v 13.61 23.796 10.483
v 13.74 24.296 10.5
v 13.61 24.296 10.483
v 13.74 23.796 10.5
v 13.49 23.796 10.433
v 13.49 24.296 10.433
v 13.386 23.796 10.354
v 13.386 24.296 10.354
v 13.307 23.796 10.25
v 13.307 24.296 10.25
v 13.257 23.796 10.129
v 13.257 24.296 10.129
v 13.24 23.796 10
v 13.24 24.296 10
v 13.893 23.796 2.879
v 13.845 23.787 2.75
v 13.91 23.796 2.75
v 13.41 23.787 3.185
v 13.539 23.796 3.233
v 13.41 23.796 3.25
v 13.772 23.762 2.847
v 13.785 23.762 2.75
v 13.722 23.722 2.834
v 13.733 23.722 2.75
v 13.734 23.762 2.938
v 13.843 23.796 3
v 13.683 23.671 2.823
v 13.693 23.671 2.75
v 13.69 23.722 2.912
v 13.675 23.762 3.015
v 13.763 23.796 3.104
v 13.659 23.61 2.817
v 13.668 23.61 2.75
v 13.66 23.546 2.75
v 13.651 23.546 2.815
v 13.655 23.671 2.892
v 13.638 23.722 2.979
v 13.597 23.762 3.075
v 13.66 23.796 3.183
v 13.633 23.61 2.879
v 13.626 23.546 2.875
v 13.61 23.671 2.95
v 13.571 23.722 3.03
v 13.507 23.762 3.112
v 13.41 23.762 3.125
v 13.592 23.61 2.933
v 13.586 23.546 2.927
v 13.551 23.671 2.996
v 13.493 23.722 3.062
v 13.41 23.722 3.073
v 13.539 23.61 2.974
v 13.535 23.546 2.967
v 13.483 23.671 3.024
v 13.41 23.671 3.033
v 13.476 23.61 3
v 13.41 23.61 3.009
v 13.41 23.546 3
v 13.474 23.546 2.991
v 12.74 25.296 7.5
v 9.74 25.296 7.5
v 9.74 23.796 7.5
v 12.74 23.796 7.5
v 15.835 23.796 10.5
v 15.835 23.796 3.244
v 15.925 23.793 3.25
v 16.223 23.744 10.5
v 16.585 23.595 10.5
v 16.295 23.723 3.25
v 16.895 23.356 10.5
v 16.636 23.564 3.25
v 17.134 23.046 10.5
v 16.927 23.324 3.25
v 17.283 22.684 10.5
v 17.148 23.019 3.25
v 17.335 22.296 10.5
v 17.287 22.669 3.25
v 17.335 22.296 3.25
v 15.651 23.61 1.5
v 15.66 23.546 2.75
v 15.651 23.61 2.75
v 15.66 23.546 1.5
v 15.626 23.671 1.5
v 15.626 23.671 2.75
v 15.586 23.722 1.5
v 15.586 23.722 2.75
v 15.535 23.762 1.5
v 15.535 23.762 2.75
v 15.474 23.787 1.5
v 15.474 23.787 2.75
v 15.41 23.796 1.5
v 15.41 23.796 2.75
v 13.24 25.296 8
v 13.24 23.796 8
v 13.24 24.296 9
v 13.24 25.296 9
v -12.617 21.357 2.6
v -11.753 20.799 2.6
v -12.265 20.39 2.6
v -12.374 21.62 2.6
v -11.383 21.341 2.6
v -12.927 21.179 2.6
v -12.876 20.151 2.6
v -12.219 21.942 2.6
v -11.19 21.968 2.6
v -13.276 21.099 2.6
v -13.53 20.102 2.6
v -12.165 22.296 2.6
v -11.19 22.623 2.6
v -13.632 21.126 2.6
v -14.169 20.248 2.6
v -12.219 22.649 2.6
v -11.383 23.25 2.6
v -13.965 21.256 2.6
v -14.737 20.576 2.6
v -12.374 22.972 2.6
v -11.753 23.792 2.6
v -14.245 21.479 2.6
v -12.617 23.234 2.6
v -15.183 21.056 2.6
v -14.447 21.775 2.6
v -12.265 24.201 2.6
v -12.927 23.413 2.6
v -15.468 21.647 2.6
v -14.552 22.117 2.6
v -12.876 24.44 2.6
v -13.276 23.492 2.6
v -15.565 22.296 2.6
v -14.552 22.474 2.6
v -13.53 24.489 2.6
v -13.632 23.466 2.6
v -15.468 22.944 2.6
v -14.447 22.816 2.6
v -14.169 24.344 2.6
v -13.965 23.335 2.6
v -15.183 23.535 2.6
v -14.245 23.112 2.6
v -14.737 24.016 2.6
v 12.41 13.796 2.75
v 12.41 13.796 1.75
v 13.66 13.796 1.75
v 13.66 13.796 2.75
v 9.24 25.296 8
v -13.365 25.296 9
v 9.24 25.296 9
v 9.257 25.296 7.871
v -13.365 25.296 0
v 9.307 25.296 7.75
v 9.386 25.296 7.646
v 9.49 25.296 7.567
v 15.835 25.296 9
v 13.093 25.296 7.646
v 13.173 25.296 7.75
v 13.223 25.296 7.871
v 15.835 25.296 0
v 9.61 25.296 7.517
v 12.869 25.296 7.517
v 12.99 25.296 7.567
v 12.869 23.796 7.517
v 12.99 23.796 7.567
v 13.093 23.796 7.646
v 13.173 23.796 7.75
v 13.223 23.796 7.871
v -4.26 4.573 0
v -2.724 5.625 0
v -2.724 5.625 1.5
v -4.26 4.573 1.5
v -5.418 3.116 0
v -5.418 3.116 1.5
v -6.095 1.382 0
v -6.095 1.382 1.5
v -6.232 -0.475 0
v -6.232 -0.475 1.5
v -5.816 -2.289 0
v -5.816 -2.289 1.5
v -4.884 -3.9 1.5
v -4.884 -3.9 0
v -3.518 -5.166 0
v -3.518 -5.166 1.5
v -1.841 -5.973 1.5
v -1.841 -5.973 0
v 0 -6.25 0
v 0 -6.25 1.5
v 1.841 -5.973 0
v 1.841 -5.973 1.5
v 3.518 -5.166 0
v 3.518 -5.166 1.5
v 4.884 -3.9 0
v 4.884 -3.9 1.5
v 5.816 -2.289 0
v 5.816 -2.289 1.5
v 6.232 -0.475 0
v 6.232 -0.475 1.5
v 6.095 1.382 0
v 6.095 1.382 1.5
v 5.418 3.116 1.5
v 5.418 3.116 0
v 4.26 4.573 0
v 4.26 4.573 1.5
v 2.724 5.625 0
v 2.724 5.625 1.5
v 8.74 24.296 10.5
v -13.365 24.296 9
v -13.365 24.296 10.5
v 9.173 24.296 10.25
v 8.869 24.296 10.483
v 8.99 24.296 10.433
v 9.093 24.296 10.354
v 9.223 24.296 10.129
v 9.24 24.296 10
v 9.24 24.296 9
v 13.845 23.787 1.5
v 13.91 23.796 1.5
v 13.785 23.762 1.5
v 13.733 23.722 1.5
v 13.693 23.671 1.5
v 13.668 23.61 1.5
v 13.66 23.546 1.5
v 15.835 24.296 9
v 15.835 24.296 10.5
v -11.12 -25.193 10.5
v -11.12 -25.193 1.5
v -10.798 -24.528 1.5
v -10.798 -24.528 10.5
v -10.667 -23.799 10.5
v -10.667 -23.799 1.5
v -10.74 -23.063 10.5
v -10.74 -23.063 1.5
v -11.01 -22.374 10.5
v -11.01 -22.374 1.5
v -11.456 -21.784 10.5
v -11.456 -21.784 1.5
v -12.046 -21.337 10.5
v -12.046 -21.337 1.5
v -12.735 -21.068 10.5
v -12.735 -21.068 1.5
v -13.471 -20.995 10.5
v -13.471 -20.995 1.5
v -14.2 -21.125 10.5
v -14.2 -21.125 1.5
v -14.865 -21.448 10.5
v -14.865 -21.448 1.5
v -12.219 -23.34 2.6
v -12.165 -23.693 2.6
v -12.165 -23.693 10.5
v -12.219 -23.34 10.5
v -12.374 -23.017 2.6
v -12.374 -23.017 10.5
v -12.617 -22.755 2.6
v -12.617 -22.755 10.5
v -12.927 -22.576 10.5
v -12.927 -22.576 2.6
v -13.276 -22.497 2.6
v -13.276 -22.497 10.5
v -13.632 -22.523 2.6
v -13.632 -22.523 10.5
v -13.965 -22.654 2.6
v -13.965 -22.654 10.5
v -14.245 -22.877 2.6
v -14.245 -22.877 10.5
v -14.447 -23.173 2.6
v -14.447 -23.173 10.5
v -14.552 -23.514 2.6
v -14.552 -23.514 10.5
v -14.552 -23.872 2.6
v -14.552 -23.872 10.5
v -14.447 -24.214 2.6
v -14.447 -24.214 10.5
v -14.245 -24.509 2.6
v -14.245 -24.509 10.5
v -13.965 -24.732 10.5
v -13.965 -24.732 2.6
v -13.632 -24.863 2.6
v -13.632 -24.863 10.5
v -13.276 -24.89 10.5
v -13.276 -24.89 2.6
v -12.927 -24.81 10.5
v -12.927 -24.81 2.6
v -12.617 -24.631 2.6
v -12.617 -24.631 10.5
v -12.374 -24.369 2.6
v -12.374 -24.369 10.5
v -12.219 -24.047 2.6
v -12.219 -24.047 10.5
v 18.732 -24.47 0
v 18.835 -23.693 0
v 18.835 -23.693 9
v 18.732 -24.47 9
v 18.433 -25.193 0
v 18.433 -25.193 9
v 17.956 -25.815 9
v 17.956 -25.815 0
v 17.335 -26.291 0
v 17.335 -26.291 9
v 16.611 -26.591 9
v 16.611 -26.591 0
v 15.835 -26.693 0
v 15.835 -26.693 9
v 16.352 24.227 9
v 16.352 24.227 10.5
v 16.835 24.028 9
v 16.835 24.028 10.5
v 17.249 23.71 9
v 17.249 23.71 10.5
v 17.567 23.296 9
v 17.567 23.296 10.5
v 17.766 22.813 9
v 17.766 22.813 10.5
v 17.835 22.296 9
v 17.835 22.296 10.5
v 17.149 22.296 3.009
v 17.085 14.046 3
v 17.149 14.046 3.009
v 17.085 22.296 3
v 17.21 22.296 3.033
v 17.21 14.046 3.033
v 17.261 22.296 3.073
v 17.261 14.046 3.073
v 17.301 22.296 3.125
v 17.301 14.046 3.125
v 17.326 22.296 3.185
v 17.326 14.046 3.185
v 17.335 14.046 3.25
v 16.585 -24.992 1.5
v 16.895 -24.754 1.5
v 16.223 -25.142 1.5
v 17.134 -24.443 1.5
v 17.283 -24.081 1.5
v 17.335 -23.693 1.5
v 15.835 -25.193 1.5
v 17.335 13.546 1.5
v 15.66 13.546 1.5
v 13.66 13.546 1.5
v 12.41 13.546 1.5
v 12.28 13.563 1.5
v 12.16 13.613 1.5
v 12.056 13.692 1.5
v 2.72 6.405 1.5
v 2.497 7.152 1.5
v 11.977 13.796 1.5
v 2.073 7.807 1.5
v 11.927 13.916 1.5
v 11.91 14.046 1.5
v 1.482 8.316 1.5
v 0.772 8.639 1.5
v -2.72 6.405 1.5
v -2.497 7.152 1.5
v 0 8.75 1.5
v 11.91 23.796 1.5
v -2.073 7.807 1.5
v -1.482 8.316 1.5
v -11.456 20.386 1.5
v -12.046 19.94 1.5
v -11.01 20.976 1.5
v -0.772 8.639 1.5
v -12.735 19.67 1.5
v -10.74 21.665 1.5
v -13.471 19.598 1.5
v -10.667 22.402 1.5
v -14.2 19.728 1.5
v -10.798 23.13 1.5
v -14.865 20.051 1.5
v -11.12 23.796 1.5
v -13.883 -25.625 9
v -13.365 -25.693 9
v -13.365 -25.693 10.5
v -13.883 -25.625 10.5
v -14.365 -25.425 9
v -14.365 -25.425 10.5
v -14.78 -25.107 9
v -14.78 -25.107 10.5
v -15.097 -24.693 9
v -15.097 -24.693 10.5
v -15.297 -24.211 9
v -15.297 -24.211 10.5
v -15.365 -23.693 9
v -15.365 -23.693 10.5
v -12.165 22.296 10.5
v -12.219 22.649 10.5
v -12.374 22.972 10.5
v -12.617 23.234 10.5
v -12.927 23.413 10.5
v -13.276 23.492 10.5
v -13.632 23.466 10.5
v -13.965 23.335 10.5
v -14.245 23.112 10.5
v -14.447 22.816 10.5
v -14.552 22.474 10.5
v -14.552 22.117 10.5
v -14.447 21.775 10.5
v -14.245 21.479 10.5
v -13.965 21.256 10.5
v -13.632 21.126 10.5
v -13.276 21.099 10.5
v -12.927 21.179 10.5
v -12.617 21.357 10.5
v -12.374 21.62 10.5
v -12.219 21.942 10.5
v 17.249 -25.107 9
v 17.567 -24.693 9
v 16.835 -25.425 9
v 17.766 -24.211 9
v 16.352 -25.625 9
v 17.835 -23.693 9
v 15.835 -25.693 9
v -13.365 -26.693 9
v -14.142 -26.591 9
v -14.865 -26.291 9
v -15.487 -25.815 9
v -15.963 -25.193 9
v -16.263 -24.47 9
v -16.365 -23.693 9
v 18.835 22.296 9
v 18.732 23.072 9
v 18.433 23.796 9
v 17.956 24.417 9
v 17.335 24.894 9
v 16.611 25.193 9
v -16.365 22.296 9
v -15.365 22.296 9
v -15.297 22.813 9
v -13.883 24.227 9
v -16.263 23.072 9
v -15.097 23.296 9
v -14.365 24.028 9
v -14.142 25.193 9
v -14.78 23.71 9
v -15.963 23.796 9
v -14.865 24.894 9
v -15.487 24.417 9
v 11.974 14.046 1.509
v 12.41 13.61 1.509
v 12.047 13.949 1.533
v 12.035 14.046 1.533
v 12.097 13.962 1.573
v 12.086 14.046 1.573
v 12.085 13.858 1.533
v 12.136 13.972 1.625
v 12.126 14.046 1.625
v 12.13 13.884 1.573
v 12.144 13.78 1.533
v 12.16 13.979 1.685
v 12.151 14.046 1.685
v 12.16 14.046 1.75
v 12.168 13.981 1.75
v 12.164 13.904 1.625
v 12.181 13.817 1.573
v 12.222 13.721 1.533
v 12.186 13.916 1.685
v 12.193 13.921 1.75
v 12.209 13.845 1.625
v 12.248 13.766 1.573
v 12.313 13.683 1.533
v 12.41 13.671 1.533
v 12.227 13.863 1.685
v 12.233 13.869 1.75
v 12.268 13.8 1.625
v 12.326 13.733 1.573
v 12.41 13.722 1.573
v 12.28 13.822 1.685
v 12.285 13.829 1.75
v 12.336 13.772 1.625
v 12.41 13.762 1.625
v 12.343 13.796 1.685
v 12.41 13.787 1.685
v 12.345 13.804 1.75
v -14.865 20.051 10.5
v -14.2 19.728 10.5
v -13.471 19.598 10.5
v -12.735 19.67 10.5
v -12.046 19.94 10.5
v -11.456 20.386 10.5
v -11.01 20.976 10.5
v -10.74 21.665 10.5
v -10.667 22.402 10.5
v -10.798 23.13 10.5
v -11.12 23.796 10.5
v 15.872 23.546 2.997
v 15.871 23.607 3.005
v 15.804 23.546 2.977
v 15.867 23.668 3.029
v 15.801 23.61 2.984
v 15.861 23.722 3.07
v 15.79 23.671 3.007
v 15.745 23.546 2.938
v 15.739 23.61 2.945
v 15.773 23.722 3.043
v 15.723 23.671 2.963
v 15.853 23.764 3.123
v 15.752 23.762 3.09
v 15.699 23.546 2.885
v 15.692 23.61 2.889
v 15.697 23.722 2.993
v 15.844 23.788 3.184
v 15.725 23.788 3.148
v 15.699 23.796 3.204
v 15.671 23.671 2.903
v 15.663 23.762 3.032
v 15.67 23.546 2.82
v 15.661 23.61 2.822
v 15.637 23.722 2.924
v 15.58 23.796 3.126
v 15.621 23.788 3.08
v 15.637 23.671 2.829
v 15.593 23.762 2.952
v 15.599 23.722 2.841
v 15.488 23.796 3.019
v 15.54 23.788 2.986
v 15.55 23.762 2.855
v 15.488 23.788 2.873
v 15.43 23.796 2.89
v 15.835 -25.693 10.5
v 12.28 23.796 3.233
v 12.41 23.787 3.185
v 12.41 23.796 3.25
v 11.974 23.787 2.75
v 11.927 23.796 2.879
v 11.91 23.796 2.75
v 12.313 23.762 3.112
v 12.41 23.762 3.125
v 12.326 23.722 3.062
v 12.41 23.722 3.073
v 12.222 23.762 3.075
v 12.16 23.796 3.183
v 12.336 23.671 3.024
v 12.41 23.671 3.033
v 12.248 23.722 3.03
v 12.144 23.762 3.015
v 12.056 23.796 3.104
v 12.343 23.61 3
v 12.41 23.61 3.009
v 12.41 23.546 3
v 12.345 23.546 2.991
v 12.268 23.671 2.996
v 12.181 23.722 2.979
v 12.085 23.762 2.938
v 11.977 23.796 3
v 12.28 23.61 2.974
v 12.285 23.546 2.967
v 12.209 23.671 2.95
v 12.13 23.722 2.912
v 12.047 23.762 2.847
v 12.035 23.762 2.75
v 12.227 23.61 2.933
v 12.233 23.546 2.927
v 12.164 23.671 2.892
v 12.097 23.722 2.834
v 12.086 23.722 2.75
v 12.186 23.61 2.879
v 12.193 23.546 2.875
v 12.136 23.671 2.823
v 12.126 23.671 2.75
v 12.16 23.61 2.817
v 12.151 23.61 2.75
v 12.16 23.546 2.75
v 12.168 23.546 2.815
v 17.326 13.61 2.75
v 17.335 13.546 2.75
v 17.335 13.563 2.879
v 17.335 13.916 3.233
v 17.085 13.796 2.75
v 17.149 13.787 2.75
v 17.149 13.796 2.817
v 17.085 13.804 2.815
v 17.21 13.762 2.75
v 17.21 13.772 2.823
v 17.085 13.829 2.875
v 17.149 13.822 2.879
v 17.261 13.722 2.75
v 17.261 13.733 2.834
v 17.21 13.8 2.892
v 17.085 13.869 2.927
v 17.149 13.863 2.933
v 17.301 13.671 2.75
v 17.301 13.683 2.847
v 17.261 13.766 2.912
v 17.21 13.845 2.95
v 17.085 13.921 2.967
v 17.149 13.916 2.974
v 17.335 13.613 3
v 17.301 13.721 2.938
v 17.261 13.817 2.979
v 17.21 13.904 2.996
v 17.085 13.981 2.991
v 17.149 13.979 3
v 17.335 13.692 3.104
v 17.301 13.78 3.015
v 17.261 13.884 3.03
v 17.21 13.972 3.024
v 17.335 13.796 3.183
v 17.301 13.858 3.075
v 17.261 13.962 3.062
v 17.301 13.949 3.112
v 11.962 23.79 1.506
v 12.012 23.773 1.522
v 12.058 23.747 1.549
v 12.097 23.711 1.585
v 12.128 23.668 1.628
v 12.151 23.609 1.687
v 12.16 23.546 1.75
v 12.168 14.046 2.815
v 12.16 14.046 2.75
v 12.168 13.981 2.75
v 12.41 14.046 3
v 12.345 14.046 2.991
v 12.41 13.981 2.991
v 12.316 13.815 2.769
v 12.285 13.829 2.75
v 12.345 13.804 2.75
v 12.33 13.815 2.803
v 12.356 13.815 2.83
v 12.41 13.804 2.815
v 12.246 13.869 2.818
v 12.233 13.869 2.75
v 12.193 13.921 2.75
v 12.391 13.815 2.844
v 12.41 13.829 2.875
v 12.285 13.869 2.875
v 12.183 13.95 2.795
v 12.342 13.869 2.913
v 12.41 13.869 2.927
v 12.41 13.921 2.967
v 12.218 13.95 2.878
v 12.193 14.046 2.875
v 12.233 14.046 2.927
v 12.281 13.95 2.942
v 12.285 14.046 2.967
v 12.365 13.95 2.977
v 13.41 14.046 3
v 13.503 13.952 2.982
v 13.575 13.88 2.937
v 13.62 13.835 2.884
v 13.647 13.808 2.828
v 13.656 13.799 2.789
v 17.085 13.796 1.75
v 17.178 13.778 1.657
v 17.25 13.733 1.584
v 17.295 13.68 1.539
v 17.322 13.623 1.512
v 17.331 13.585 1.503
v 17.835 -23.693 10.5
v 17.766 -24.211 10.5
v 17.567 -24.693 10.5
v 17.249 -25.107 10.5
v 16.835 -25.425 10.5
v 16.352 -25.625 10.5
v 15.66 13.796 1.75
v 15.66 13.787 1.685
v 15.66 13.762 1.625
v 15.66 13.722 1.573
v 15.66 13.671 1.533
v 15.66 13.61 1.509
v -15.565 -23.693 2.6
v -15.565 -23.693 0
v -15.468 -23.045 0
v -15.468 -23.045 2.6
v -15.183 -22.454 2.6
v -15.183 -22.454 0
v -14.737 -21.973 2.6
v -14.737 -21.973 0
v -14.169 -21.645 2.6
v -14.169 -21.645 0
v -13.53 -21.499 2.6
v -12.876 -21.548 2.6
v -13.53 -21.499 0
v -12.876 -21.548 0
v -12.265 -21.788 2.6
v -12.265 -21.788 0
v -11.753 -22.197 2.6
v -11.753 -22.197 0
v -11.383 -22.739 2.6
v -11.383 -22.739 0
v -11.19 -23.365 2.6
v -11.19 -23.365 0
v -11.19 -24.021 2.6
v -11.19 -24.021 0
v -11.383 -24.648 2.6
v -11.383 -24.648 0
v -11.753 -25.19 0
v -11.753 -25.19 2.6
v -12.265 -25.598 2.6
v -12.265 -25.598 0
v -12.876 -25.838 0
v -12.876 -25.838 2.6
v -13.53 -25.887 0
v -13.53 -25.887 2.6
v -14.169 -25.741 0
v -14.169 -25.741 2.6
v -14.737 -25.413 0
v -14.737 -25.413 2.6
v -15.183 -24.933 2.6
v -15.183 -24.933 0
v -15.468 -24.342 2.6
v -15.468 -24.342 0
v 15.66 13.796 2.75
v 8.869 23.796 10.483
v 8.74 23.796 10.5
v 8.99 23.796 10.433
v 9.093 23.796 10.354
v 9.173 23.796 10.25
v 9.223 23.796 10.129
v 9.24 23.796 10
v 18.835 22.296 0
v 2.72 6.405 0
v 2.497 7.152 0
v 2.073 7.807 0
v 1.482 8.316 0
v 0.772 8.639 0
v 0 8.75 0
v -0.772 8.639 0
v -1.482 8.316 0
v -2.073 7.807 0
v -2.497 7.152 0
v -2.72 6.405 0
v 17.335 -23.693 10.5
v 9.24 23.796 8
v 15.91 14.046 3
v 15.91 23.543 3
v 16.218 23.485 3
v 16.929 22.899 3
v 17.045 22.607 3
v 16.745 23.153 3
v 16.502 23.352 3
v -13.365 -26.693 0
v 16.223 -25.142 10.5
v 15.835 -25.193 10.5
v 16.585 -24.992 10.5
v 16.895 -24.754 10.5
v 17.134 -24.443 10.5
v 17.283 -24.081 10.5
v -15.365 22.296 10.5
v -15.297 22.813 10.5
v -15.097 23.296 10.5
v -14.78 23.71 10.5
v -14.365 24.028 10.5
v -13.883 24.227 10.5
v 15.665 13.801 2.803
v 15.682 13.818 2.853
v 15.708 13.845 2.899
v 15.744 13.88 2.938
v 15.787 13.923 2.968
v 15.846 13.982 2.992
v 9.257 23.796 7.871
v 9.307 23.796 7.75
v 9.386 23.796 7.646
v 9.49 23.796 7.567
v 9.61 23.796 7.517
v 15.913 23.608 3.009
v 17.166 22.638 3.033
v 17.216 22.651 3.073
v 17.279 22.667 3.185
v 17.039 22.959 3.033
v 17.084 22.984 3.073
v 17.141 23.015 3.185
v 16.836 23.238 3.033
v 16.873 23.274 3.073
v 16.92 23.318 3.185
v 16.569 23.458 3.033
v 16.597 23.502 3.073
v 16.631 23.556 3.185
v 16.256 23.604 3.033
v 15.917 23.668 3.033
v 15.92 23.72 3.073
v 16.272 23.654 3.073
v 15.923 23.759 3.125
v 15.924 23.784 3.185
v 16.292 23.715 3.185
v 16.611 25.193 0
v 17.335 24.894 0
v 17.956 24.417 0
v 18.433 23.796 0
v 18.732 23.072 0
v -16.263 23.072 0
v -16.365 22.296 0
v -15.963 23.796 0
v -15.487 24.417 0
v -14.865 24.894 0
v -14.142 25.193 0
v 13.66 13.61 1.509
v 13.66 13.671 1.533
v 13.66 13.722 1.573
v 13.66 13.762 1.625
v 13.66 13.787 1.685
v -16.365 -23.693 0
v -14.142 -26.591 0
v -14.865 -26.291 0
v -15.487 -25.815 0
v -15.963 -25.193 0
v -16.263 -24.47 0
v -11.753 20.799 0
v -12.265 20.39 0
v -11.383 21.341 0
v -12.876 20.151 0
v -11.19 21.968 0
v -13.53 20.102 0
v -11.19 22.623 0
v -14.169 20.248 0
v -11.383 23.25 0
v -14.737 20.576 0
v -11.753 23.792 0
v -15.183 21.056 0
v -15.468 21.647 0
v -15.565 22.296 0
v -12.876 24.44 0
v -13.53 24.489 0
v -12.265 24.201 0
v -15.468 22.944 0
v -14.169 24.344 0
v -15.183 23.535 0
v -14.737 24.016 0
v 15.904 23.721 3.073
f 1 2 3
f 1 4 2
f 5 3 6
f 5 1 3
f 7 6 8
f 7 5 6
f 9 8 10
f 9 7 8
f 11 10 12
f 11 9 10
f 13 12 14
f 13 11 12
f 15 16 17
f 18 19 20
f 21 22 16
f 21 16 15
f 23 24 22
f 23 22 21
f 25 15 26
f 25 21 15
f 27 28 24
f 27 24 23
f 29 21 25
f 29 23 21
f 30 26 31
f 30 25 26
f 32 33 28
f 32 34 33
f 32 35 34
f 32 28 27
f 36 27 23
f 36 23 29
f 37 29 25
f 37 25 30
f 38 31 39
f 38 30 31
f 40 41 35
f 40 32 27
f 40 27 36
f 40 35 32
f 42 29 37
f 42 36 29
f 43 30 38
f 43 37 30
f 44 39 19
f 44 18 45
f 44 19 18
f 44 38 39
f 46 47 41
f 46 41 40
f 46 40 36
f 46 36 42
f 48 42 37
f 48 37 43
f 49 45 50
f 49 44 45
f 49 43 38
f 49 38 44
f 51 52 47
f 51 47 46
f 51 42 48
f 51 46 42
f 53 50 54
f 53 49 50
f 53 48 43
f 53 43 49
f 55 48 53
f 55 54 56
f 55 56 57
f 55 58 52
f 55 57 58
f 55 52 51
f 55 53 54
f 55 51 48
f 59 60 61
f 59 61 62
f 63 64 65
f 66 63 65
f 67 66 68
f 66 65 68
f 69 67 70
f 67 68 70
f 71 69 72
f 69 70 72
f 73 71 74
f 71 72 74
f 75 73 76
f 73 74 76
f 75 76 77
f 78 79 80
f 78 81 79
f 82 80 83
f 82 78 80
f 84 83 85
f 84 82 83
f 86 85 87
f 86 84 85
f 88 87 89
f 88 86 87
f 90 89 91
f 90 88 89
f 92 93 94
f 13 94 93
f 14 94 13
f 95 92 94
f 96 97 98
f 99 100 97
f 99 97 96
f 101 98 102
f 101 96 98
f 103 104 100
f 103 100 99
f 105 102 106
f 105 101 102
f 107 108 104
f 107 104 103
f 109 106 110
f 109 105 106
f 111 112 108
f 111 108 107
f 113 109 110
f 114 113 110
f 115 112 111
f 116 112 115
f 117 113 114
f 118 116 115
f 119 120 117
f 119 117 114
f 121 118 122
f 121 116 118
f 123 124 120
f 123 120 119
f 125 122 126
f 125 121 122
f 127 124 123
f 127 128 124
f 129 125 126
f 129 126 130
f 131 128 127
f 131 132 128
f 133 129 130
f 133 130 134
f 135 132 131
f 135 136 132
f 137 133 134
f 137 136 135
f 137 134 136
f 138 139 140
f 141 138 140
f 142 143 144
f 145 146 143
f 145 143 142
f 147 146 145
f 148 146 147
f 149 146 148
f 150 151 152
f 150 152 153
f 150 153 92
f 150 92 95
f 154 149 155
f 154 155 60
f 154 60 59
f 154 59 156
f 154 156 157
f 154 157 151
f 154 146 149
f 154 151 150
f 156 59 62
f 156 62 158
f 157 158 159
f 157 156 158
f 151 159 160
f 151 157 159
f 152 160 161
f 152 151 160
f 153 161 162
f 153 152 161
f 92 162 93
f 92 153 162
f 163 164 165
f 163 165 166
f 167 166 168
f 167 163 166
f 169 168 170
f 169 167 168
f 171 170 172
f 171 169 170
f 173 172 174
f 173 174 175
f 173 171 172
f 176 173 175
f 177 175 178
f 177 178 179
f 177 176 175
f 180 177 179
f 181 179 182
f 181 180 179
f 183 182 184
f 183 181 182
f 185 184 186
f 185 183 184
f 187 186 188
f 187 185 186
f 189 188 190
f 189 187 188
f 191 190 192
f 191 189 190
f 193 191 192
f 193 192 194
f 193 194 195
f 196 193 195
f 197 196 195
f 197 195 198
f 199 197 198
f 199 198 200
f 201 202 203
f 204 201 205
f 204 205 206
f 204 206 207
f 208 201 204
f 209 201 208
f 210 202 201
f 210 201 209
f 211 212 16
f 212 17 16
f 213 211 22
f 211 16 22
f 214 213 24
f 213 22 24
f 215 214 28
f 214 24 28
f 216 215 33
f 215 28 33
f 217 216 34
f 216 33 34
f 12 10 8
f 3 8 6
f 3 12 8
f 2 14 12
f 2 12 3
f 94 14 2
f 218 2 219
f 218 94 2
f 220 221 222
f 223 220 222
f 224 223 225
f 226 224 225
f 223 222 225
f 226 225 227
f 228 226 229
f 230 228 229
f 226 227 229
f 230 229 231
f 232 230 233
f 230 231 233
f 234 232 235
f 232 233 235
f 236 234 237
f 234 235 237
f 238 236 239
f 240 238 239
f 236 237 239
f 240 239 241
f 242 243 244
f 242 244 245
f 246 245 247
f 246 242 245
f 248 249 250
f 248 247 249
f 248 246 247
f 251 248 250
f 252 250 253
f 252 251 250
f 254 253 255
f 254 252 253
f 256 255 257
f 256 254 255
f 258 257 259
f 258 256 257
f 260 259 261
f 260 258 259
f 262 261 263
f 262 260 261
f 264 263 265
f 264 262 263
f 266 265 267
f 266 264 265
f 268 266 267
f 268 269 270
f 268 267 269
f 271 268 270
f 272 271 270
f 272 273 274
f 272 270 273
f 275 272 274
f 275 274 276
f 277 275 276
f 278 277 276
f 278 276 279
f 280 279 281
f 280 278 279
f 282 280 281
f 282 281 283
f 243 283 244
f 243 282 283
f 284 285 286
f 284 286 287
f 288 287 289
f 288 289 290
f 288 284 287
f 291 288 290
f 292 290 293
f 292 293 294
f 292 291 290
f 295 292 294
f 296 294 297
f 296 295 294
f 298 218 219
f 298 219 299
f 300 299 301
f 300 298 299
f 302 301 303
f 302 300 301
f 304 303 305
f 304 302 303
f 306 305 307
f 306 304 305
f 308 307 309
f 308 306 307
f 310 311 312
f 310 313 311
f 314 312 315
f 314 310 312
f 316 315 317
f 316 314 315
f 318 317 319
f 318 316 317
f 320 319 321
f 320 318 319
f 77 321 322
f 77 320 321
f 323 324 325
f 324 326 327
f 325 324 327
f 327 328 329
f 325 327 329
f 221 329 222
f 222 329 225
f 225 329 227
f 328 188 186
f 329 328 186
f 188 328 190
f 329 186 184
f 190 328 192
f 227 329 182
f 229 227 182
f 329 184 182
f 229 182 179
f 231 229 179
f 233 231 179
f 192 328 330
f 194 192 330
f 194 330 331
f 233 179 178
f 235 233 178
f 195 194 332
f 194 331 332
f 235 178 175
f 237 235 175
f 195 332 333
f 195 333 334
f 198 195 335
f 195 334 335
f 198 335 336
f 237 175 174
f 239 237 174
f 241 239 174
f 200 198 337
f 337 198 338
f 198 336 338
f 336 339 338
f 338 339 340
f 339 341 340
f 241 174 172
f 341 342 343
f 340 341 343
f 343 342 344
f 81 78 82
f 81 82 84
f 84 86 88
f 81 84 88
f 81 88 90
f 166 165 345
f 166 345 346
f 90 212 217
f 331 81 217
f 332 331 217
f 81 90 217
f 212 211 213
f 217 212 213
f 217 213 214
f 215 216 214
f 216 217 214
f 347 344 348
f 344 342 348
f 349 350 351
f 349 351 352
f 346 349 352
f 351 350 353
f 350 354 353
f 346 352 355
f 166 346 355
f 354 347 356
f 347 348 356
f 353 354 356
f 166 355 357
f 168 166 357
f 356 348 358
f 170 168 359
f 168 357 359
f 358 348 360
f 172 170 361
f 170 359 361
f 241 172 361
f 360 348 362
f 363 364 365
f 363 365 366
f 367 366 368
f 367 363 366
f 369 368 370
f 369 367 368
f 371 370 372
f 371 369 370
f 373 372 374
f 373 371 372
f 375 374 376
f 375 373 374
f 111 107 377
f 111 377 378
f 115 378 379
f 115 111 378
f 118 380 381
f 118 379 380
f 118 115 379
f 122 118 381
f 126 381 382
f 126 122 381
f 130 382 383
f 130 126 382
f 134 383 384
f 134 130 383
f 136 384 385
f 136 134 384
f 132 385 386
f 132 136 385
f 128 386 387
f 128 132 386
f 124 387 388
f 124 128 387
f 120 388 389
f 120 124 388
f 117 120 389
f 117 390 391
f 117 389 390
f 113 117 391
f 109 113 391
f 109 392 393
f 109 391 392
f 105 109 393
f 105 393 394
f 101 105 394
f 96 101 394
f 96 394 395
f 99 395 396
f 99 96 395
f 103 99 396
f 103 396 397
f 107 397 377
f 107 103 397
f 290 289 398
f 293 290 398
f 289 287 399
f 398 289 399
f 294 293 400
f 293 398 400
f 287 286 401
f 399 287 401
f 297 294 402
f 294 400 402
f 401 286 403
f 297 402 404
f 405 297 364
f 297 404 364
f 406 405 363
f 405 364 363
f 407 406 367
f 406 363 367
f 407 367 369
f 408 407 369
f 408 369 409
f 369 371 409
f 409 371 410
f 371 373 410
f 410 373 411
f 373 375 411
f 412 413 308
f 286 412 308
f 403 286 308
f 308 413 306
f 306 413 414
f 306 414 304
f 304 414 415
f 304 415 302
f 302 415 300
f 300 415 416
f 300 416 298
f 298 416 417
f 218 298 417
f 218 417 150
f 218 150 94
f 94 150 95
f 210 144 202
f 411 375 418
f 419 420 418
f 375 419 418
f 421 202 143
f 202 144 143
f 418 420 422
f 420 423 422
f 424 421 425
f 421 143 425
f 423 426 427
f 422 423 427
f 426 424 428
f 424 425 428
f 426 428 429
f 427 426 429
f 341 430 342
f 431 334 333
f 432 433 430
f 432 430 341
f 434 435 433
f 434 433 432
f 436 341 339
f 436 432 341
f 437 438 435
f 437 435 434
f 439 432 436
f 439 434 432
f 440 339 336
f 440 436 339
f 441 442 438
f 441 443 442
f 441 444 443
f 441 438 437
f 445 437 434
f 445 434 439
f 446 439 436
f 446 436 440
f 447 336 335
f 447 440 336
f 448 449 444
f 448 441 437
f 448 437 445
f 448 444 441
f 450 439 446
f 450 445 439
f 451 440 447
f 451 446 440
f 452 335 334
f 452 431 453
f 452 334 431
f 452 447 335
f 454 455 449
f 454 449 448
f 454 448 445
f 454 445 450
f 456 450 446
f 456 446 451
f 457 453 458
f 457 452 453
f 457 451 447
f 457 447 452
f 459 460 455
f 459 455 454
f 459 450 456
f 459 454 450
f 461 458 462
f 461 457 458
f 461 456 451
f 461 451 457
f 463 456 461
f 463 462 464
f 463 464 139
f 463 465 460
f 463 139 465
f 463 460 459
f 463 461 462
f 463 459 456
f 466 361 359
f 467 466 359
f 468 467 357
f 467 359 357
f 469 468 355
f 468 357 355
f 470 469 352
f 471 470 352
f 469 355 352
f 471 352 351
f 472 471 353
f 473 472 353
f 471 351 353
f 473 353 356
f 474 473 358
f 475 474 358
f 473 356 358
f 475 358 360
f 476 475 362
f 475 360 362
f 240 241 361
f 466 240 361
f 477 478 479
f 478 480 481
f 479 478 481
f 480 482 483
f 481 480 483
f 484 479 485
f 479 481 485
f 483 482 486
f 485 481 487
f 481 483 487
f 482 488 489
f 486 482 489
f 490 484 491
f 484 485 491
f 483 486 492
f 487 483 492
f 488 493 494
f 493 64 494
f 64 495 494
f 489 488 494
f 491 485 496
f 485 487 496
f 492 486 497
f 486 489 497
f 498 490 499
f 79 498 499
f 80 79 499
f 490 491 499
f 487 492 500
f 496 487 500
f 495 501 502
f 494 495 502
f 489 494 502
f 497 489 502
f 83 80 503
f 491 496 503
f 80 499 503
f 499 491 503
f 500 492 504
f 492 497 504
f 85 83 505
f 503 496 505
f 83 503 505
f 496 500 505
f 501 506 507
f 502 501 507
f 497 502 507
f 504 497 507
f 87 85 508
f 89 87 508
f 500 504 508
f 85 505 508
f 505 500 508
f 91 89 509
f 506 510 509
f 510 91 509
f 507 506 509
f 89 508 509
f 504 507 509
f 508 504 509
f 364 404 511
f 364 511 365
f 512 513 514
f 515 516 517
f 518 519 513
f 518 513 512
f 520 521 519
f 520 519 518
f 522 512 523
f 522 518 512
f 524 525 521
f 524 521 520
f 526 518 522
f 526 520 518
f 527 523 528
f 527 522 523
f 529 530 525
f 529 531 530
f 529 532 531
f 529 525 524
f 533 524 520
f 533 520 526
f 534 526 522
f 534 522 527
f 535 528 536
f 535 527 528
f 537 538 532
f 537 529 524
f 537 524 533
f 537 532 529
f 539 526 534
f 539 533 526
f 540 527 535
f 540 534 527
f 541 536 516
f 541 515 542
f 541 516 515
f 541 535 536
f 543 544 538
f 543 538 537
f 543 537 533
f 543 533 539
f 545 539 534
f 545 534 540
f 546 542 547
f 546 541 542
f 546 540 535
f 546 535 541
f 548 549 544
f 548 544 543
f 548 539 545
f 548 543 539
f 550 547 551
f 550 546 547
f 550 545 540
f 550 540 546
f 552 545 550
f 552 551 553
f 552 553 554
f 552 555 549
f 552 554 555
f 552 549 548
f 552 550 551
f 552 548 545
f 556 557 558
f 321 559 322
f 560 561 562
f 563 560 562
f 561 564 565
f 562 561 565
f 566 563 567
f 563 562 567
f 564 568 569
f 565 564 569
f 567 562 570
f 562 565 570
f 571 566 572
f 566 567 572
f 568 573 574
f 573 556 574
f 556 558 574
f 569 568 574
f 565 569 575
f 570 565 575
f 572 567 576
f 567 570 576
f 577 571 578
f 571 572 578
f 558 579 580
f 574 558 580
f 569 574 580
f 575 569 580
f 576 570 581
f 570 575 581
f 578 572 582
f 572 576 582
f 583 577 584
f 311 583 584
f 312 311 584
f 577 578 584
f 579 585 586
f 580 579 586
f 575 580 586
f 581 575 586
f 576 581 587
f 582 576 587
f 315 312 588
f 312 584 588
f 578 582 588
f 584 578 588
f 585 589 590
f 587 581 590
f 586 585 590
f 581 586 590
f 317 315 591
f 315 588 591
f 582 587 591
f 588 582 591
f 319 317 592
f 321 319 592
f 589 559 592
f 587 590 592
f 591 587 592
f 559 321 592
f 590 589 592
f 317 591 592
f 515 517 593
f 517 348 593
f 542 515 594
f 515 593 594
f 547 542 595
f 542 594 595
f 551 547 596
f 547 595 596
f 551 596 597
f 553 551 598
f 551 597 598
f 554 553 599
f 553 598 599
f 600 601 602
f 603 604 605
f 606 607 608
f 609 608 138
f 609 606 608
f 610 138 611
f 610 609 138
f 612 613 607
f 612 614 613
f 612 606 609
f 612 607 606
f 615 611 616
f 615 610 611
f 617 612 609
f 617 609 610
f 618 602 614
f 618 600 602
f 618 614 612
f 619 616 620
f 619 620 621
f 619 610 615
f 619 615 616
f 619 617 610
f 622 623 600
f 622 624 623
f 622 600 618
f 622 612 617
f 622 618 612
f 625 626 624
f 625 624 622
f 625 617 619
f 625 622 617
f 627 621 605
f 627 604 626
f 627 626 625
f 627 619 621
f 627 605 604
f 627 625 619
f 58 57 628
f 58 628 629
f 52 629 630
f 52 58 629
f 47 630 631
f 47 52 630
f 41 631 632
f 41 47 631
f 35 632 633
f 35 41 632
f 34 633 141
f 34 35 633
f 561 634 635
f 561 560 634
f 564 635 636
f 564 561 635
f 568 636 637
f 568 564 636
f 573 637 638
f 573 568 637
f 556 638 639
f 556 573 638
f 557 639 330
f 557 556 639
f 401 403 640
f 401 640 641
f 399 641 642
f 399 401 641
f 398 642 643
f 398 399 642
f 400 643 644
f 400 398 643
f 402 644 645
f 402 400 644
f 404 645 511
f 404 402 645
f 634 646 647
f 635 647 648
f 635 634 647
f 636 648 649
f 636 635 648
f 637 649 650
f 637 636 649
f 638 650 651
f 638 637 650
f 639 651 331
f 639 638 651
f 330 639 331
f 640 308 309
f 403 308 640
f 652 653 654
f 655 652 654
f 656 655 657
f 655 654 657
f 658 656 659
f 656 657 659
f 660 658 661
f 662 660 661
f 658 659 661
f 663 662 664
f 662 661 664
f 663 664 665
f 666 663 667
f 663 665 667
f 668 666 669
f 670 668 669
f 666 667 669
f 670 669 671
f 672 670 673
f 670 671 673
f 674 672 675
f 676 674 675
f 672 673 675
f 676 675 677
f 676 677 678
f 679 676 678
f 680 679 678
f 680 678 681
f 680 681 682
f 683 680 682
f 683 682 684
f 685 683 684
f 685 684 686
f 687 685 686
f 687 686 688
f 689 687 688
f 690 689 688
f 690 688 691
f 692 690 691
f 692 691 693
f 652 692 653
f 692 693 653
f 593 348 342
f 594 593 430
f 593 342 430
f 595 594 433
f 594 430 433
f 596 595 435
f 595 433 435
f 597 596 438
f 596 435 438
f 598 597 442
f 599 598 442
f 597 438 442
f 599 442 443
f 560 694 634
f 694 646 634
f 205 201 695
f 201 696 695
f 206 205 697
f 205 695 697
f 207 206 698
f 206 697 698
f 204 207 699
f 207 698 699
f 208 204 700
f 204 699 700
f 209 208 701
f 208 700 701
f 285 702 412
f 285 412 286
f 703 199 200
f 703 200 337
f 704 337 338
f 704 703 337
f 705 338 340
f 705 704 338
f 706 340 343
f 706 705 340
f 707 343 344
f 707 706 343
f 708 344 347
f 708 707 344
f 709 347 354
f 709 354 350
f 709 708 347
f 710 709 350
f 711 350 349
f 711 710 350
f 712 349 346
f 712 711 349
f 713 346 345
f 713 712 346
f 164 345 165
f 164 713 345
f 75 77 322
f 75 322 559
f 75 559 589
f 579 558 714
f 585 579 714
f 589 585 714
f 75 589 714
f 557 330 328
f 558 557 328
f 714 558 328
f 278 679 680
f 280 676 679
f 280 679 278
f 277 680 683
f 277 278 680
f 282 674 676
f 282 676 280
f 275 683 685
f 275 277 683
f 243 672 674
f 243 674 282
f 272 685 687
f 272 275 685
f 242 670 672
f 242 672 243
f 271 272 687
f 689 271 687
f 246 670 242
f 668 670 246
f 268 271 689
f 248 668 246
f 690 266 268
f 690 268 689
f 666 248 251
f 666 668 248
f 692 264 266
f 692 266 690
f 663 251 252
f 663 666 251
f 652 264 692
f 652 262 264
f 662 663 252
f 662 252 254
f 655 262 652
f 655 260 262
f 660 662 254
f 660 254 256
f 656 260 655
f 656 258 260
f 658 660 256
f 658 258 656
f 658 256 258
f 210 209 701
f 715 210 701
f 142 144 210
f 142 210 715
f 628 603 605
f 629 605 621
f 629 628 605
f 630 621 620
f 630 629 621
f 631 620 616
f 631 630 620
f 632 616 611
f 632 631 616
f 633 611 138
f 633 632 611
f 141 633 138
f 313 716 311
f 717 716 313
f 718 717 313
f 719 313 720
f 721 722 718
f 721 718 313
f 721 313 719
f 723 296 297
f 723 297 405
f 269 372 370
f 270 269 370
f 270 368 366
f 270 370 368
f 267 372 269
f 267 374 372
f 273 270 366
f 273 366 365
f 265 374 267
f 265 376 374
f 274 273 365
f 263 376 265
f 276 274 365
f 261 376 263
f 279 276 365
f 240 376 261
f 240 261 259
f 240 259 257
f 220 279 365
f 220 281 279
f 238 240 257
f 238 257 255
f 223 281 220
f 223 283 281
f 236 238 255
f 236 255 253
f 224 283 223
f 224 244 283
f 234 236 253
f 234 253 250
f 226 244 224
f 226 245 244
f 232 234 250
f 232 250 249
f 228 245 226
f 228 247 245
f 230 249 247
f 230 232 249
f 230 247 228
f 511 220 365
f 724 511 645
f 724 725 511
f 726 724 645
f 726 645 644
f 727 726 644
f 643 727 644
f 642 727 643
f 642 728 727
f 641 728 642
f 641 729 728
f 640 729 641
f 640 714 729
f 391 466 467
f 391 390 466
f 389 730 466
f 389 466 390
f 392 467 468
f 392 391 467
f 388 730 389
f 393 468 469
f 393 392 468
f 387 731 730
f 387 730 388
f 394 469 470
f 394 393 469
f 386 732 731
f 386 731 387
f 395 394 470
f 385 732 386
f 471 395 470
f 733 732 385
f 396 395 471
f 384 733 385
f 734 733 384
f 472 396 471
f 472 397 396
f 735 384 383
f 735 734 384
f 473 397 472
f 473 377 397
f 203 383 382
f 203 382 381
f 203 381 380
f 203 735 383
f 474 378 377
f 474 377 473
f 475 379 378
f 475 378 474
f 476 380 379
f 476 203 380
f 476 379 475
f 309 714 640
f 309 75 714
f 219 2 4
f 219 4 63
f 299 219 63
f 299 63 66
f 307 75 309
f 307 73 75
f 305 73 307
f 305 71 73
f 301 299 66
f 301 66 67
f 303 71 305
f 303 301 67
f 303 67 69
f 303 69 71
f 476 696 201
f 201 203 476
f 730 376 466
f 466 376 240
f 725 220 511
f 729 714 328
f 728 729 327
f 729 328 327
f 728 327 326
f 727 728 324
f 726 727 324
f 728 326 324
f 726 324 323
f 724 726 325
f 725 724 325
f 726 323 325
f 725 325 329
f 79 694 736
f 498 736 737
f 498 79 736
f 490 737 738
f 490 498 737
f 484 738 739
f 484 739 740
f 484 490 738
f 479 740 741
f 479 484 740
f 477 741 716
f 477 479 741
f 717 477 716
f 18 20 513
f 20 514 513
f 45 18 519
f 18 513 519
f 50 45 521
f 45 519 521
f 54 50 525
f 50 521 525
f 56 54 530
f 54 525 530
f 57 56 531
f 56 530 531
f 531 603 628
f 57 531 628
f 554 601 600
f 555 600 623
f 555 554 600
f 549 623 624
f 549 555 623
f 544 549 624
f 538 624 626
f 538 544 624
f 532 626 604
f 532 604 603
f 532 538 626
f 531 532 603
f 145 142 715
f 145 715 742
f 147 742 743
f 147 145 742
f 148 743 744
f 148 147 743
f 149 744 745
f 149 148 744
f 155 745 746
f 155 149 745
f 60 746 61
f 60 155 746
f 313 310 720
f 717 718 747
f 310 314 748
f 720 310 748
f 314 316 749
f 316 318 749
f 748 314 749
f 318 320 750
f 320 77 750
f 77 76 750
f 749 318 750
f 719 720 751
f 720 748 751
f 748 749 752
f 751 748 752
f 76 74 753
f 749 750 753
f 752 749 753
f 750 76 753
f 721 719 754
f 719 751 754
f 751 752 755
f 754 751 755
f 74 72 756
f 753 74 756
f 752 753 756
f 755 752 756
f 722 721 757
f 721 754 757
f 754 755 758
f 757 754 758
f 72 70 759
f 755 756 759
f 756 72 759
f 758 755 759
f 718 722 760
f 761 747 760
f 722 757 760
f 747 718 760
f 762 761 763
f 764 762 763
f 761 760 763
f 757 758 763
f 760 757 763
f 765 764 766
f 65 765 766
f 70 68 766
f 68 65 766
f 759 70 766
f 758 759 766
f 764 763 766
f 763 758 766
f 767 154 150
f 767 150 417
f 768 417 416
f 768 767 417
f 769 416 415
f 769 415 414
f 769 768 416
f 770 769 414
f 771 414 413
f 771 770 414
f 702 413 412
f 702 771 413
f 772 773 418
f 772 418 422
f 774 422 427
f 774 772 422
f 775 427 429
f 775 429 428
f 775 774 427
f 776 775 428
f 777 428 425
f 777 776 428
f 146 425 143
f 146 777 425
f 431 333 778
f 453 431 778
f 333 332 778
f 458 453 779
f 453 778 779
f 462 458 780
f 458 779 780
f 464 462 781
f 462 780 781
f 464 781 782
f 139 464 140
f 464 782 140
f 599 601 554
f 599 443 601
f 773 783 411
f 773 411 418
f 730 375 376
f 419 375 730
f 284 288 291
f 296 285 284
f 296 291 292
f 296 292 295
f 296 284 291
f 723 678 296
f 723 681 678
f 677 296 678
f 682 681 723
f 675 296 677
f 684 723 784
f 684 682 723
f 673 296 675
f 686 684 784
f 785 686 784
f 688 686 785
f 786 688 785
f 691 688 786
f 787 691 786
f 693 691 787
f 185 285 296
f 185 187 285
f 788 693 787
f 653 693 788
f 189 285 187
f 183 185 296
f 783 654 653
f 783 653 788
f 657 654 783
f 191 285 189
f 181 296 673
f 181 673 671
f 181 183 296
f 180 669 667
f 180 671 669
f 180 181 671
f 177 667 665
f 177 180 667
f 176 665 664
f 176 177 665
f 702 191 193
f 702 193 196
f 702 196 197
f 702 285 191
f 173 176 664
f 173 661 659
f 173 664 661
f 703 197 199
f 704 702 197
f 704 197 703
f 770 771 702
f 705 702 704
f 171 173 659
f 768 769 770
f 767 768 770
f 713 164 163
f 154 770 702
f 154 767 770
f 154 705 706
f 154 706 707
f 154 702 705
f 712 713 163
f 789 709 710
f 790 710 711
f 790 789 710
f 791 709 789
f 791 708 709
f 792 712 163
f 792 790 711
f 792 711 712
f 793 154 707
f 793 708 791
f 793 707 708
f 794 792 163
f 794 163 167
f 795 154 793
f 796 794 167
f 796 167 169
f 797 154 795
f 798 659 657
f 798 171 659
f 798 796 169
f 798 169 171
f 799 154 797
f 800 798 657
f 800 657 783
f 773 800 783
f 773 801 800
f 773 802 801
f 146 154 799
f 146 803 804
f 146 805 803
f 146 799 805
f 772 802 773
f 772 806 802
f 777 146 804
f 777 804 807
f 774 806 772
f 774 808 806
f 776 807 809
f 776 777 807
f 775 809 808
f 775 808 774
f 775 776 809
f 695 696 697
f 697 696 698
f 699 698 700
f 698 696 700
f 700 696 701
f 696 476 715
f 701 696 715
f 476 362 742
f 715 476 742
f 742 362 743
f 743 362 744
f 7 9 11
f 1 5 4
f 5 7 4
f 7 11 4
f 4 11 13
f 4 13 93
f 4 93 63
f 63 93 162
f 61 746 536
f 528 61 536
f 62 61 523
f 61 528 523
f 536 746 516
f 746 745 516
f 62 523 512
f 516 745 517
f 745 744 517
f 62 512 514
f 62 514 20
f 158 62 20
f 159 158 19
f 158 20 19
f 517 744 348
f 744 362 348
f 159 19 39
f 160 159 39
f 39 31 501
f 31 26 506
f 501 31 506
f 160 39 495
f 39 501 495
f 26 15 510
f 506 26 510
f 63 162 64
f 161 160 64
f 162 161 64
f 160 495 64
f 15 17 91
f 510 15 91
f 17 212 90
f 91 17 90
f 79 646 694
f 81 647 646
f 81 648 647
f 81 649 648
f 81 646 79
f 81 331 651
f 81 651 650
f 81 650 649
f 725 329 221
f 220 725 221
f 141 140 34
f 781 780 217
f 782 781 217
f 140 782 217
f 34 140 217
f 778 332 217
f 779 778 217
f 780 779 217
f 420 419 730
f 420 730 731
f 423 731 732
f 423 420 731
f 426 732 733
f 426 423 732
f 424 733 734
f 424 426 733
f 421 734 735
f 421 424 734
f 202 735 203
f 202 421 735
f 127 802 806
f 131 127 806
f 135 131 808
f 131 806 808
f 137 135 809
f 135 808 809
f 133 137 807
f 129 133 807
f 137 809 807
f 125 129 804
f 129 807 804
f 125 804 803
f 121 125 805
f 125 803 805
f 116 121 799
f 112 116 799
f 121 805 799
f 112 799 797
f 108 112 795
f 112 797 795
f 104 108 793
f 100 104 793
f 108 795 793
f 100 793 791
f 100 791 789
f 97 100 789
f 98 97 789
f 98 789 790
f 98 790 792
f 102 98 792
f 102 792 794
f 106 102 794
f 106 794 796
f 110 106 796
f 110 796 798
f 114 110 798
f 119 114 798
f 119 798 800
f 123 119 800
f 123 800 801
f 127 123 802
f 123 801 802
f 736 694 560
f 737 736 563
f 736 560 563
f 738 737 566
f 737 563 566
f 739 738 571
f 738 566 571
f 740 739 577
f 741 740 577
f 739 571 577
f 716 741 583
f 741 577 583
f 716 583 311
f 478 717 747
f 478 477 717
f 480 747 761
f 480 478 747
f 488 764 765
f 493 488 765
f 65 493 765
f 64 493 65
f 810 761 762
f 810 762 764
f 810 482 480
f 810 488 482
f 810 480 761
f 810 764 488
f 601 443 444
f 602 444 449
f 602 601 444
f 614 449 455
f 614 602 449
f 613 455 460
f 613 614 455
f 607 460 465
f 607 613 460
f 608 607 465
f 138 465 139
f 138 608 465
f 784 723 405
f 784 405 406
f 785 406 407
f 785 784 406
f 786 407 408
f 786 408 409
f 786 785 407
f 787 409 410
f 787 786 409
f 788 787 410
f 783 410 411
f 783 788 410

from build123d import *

# Parameters (mm, degrees)
EXRUDE_BASE_DEPTH       = 1.5
EXTRUDE_SIDEWALLS_DEPTH = 9
PARTLING_LINE_LIP_START = -1.5
PARTLING_LINE_LIP_DEPTH = 1.5
SKETCH4_W               = 1.5
SKETCH4_H               = 10
SKETCH4_W_2             = 2.151899305
BOSS_EXTRUDE3_DEPTH     = 1.5
FILLET2_R               = 0.25
CUT_EXTRUDE2_DEPTH      = 1.5
FILLET3_R               = 0.5
SCREWBOSS_DEPTH         = 9
SCREWHOLE_DEPTH         = 34.88613029
SCREWHOLE_DEPTH_BACK    = 34.88613029
SCREW_HOLES_R           = 1.2
SKETCH8_R               = 2.2
CUT_EXTRUDE4_DEPTH      = 2.6


with BuildPart() as part:
    # Sketch1 → Exrude-Base (new body)
    with BuildSketch(Plane.XY):
        with BuildLine():
            Line((9.739580757, 25.295602697), (12.739580757, 25.295602697))
            Line((12.739580757, 25.295602697), (13.239580757, 25.295602697))
            Line((13.239580757, 25.295602697), (13.739580757, 25.295602697))
            Line((13.739580757, 25.295602697), (15.834580757, 25.295602697))
            ThreePointArc((15.834580757, 25.295602697), (17.9559011, 24.41692304), (18.834580757, 22.295602697))
            Line((18.834580757, 22.295602697), (18.834580757, -23.693227454))
            ThreePointArc((18.834580757, -23.693227454), (17.9559011, -25.814547798), (15.834580757, -26.693227454))
            Line((15.834580757, -26.693227454), (-13.365419243, -26.693227454))
            ThreePointArc((-13.365419243, -26.693227454), (-15.486739587, -25.814547798), (-16.365419243, -23.693227454))
            Line((-16.365419243, -23.693227454), (-16.365419243, 22.295602697))
            ThreePointArc((-16.365419243, 22.295602697), (-15.486739587, 24.41692304), (-13.365419243, 25.295602697))
            Line((-13.365419243, 25.295602697), (8.739580757, 25.295602697))
            Line((8.739580757, 25.295602697), (9.239580757, 25.295602697))
            Line((9.239580757, 25.295602697), (9.739580757, 25.295602697))
        make_face()
        with BuildLine():
            ThreePointArc((-2.72431184, 5.625), (0, -6.25), (2.72431184, 5.625))
            ThreePointArc((2.72431184, 5.625), (0, 8.75), (-2.72431184, 5.625))
        make_face(mode=Mode.SUBTRACT)
    extrude(amount=EXRUDE_BASE_DEPTH)

    # Sketch2 → Extrude-Sidewalls (add)
    with BuildSketch(Plane.XY.offset(1.5)):
        with BuildLine():
            Line((18.834580757, 22.295602697), (18.834580757, -23.693227454))
            ThreePointArc((18.834580757, -23.693227454), (17.9559011, -25.814547798), (15.834580757, -26.693227454))
            Line((15.834580757, -26.693227454), (-13.365419243, -26.693227454))
            ThreePointArc((-13.365419243, -26.693227454), (-15.486739587, -25.814547798), (-16.365419243, -23.693227454))
            Line((-16.365419243, -23.693227454), (-16.365419243, 22.295602697))
            ThreePointArc((-16.365419243, 22.295602697), (-15.486739587, 24.41692304), (-13.365419243, 25.295602697))
            Line((-13.365419243, 25.295602697), (15.834580757, 25.295602697))
            ThreePointArc((15.834580757, 25.295602697), (17.9559011, 24.41692304), (18.834580757, 22.295602697))
        make_face()
        with BuildLine():
            Line((17.334580757, 22.295602697), (17.334580757, -23.693227454))
            ThreePointArc((17.334580757, -23.693227454), (16.895240929, -24.753887626), (15.834580757, -25.193227454))
            Line((15.834580757, -25.193227454), (-13.365419243, -25.193227454))
            ThreePointArc((-13.365419243, -25.193227454), (-14.426079415, -24.753887626), (-14.865419243, -23.693227454))
            Line((-14.865419243, -23.693227454), (-14.865419243, 22.295602697))
            ThreePointArc((-14.865419243, 22.295602697), (-14.426079415, 23.356262868), (-13.365419243, 23.795602697))
            Line((-13.365419243, 23.795602697), (15.834580757, 23.795602697))
            ThreePointArc((15.834580757, 23.795602697), (16.895240929, 23.356262868), (17.334580757, 22.295602697))
        make_face(mode=Mode.SUBTRACT)
    extrude(amount=EXTRUDE_SIDEWALLS_DEPTH)

    # Sketch3 → Partling-Line-Lip (cut)
    with BuildSketch(Plane.XY.offset(10.5).offset(PARTLING_LINE_LIP_START)):
        with BuildLine():
            Line((18.834580757, 22.295602697), (18.834580757, -23.693227454))
            ThreePointArc((18.834580757, -23.693227454), (17.9559011, -25.814547798), (15.834580757, -26.693227454))
            Line((15.834580757, -26.693227454), (-13.365419243, -26.693227454))
            ThreePointArc((-13.365419243, -26.693227454), (-15.486739587, -25.814547798), (-16.365419243, -23.693227454))
            Line((-16.365419243, -23.693227454), (-16.365419243, 22.295602697))
            ThreePointArc((-16.365419243, 22.295602697), (-15.486739587, 24.41692304), (-13.365419243, 25.295602697))
            Line((-13.365419243, 25.295602697), (15.834580757, 25.295602697))
            ThreePointArc((15.834580757, 25.295602697), (17.9559011, 24.41692304), (18.834580757, 22.295602697))
        make_face()
        with BuildLine():
            Line((17.834580757, 22.295602697), (17.834580757, -23.693227454))
            ThreePointArc((17.834580757, -23.693227454), (17.248794319, -25.107441017), (15.834580757, -25.693227454))
            Line((15.834580757, -25.693227454), (-13.365419243, -25.693227454))
            ThreePointArc((-13.365419243, -25.693227454), (-14.779632806, -25.107441017), (-15.365419243, -23.693227454))
            Line((-15.365419243, -23.693227454), (-15.365419243, 22.295602697))
            ThreePointArc((-15.365419243, 22.295602697), (-14.779632806, 23.709816259), (-13.365419243, 24.295602697))
            Line((-13.365419243, 24.295602697), (15.834580757, 24.295602697))
            ThreePointArc((15.834580757, 24.295602697), (17.248794319, 23.709816259), (17.834580757, 22.295602697))
        make_face(mode=Mode.SUBTRACT)
    extrude(amount=PARTLING_LINE_LIP_DEPTH, mode=Mode.SUBTRACT)

    # Sketch4 → Boss-Extrude3 (add)
    with BuildSketch(Plane.XY.offset(1.5)):
        with Locations((12.909580757, 18.795602697)):
            Rectangle(SKETCH4_W, SKETCH4_H)
        with Locations((16.73553041, 18.795602697)):
            Rectangle(SKETCH4_W_2, SKETCH4_H)
    extrude(amount=BOSS_EXTRUDE3_DEPTH)

    # Fillet2
    fillet2_edges = [part.edges().sort_by_distance(p)[0] for p in [
        (13.659580757, 18.795602697, 3),
        (12.159580757, 18.795602697, 3),
        (12.159580757, 13.795602697, 2.25),
        (16.497080757, 13.795602697, 3),
        (15.659580757, 18.795602697, 3),
        (12.909580757, 13.795602697, 3),
    ]]
    fillet(fillet2_edges, radius=FILLET2_R)
    fillet2_2_edges = [part.edges().sort_by_distance(p)[0] for p in [
        (13.659580757, 23.795602697, 2.125),
        (13.034580757, 13.795602697, 1.5),
        (17.334580757, 13.795602697, 2.125),
        (15.659580757, 23.795602697, 2.125),
        (12.909580757, 23.795602697, 3),
        (12.159580757, 23.795602697, 2.125),
        (12.159580757, 18.920602697, 1.5),
        (17.334580757, 18.170602697, 3),
        (16.921434013, 23.329406353, 3),
        (16.497080757, 13.795602697, 1.5),
        (15.871629396, 23.795145092, 2.997102598),
        (15.708024313, 23.795602697, 2.897901995),
        (17.334580757, 13.868826001, 2.926776695),
        (12.232804061, 13.868826001, 1.5),
        (12.232804061, 23.795602697, 2.926776695),
        (13.586357452, 23.795602697, 2.926776695),
    ]]
    fillet(fillet2_2_edges, radius=FILLET2_R)

    # Sketch5 → Cut-Extrude2 (cut)
    with BuildSketch(Plane(origin=(0, 25.295602697, 0), x_dir=(1, 0, 0), z_dir=(0, 1, 0))):
        with BuildLine():
            Line((9.239580757, -10.5), (9.239580757, -8))
            ThreePointArc((9.239580757, -8), (9.386027366, -7.646446609), (9.739580757, -7.5))
            Line((9.739580757, -7.5), (12.739580757, -7.5))
            ThreePointArc((12.739580757, -7.5), (13.093134147, -7.646446609), (13.239580757, -8))
            Line((13.239580757, -8), (13.239580757, -10.5))
            Line((13.239580757, -10.5), (9.239580757, -10.5))
        make_face()
    extrude(amount=-CUT_EXTRUDE2_DEPTH, mode=Mode.SUBTRACT)

    # Fillet3
    fillet3_edges = [part.edges().sort_by_distance(p)[0] for p in [
        (13.239580757, 24.045602697, 10.5),
        (9.239580757, 24.045602697, 10.5),
    ]]
    fillet(fillet3_edges, radius=FILLET3_R)

    # Sketch7 → ScrewBoss (add)
    with BuildSketch(Plane.XY.offset(1.5)):
        with BuildLine():
            Line((-13.365419243, -25.193227454), (-11.120424811, -25.193227454))
            ThreePointArc((-11.120424811, -25.193227454), (-11.456230934, -21.784039145), (-14.865419243, -21.448233022))
            Line((-14.865419243, -21.448233022), (-14.865419243, -23.693227454))
            ThreePointArc((-14.865419243, -23.693227454), (-14.426079415, -24.753887626), (-13.365419243, -25.193227454))
        make_face()
        with BuildLine():
            Line((-11.120424811, 23.795602697), (-13.365419243, 23.795602697))
            ThreePointArc((-13.365419243, 23.795602697), (-14.426079415, 23.356262868), (-14.865419243, 22.295602697))
            Line((-14.865419243, 22.295602697), (-14.865419243, 20.050608265))
            ThreePointArc((-14.865419243, 20.050608265), (-11.456230934, 20.386414387), (-11.120424811, 23.795602697))
        make_face()
    extrude(amount=SCREWBOSS_DEPTH)

    # Screw-Holes → ScrewHole (cut, two sides: drawn at the far end of the back side and taken through both)
    with BuildSketch(Plane.XY.offset(1.5).offset(-SCREWHOLE_DEPTH_BACK)):
        with Locations((-13.365419243, 22.295602697)):
            Circle(SCREW_HOLES_R)
        with Locations((-13.365419243, -23.693227454)):
            Circle(SCREW_HOLES_R)
    extrude(amount=SCREWHOLE_DEPTH + SCREWHOLE_DEPTH_BACK, mode=Mode.SUBTRACT)

    # Sketch8 → Cut-Extrude4 (cut)
    with BuildSketch(Plane(origin=(0, 0, 0), x_dir=(-1, 0, 0), z_dir=(0, 0, -1))):
        with Locations((13.365419243, 22.295602697)):
            Circle(SKETCH8_R)
        with Locations((13.365419243, -23.693227454)):
            Circle(SKETCH8_R)
    extrude(amount=-CUT_EXTRUDE4_DEPTH, mode=Mode.SUBTRACT)


solid = part.part
